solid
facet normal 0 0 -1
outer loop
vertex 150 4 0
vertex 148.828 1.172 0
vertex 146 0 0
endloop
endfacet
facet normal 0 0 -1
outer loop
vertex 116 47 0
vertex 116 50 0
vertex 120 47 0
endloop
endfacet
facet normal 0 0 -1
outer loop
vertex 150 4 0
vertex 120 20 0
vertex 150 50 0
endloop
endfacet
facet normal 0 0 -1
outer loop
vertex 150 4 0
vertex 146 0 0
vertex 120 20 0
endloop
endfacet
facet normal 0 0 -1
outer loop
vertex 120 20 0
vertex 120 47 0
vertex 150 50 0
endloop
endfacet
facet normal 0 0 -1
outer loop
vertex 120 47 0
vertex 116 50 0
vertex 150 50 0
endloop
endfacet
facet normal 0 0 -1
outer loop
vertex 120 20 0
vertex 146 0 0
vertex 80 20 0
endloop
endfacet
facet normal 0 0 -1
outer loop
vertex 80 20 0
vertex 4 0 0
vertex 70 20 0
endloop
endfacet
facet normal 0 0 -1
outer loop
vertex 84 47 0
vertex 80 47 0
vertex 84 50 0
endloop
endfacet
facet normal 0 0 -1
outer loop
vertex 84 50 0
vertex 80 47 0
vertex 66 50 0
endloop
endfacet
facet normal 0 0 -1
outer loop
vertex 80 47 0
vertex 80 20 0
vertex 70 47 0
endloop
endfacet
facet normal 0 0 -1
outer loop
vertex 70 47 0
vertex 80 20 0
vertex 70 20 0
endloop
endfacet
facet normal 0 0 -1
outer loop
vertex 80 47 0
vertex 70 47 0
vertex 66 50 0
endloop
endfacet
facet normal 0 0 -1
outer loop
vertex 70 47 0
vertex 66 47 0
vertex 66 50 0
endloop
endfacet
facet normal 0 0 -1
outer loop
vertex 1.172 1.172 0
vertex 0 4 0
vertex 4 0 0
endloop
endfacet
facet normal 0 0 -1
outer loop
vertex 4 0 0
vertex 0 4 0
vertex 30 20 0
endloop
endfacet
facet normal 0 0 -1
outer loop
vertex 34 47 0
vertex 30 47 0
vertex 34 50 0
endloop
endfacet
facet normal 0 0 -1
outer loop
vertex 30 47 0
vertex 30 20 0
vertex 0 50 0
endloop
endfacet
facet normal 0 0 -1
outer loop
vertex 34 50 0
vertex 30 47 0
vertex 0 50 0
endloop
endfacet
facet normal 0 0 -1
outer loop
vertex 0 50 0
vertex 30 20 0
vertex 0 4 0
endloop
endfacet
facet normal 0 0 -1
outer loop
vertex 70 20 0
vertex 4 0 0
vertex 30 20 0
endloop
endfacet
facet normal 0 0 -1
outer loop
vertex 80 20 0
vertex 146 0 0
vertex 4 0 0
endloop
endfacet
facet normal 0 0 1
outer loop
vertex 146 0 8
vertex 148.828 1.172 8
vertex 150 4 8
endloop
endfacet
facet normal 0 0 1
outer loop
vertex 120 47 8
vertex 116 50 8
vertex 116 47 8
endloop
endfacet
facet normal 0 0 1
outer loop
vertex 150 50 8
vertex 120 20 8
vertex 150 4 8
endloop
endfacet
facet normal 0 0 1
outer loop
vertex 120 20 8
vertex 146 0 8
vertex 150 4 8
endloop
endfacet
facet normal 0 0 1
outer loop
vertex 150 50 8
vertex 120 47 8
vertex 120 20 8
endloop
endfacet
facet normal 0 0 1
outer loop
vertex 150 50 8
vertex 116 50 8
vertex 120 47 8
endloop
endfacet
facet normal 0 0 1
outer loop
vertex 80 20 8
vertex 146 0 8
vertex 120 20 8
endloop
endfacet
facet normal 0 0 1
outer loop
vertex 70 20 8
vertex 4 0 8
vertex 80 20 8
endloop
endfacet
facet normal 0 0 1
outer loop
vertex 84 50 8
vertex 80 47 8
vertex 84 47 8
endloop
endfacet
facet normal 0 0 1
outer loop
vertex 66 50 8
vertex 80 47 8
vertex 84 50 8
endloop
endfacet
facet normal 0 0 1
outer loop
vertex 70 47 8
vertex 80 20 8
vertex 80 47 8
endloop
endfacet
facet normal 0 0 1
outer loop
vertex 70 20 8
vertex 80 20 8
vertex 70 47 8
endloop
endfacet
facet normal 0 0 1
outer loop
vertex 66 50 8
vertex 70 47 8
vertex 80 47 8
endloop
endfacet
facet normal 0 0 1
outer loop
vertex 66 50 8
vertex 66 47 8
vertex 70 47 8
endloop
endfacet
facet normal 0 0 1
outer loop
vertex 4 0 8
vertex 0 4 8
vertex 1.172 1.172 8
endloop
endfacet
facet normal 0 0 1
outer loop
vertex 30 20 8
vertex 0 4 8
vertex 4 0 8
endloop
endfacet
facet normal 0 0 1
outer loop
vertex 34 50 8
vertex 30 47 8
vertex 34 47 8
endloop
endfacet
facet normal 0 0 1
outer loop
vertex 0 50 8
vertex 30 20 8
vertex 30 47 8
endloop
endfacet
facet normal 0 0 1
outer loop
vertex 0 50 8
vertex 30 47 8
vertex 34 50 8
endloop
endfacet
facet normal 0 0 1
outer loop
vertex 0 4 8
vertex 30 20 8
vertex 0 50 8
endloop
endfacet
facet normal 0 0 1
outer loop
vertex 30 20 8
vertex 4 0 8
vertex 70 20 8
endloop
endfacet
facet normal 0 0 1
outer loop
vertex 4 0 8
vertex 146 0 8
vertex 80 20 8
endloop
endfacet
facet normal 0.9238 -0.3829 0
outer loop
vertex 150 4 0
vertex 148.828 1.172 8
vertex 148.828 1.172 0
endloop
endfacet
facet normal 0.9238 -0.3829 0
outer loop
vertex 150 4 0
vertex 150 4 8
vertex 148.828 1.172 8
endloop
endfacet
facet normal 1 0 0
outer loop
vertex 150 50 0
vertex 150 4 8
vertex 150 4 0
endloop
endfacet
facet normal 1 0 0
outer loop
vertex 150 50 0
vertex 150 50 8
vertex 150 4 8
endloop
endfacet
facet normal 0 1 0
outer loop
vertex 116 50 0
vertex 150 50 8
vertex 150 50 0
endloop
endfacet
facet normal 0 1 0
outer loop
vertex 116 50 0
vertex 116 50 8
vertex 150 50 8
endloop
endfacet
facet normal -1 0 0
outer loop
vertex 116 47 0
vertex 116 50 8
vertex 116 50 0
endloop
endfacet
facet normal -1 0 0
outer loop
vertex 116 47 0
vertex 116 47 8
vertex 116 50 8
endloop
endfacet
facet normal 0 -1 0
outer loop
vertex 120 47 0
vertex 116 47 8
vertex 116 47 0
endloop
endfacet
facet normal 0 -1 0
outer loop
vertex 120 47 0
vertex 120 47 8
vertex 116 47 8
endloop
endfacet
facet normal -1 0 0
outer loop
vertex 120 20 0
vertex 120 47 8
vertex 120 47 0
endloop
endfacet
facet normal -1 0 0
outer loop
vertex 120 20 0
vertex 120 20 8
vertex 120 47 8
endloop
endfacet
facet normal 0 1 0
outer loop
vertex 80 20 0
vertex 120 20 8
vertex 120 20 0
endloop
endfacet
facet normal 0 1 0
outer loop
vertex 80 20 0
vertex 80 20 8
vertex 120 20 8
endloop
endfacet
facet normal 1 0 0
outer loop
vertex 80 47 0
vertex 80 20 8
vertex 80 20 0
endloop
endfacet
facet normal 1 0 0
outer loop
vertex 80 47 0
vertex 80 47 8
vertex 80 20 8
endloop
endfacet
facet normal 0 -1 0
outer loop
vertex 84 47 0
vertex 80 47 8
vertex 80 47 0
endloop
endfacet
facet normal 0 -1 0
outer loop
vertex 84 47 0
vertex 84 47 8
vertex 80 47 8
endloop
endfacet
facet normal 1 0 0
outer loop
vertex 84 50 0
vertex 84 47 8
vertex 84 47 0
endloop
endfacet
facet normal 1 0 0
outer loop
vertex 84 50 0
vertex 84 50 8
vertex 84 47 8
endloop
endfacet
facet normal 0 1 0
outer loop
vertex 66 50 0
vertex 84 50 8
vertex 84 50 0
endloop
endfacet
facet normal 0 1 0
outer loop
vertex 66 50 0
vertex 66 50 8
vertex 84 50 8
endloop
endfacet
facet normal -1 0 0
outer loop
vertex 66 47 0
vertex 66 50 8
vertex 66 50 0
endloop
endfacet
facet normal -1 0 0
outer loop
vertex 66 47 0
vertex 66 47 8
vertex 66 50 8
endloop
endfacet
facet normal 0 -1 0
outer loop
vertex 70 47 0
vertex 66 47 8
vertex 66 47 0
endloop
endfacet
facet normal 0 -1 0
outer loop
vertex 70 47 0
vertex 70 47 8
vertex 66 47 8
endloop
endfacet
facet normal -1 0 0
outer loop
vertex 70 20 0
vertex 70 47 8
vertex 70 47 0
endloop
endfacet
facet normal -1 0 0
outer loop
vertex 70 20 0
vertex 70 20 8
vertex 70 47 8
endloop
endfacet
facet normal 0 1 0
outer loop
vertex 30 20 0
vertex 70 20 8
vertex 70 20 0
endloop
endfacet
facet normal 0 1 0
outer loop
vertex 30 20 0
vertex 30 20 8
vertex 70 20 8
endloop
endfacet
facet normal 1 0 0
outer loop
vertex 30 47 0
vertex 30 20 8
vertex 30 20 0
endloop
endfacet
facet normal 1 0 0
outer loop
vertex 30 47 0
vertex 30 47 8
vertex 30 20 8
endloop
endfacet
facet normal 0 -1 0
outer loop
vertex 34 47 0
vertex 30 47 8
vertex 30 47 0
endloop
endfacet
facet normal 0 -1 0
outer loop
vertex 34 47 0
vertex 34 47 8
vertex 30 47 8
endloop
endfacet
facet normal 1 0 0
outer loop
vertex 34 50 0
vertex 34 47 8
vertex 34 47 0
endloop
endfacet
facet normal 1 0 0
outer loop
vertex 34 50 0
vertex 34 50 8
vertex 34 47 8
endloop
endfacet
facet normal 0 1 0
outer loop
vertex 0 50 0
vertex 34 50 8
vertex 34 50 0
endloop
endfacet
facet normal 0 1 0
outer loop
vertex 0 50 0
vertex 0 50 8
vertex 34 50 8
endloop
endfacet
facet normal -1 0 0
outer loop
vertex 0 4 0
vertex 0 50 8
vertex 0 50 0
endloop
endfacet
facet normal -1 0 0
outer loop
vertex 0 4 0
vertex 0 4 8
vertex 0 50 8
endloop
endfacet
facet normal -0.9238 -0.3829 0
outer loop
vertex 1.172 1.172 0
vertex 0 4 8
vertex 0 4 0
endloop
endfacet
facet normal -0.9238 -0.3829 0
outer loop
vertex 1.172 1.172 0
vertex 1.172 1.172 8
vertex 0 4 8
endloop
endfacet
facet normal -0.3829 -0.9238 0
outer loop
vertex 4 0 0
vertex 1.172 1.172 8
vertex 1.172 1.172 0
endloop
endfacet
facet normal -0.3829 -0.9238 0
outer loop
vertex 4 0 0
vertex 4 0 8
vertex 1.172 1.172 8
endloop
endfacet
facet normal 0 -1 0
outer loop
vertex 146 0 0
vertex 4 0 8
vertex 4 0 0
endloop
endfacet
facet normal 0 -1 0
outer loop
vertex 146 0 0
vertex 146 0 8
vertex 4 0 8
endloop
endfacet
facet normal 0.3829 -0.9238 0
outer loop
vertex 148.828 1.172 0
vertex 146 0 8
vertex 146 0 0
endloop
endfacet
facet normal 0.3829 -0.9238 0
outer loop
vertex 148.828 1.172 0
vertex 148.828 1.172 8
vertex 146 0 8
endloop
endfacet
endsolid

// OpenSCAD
$fn = 32;

// ----------------------------------------------------------------------
// Oversize slot bar: 150 mm bar with 2 oversize windows
// ----------------------------------------------------------------------

// --- parameters (mm) ---
profile_height = 8;       // extrusion height
profile_points = 24;      // points of the closed outline

profile = [[0, 4], [1.172, 1.172], [4, 0], [146, 0], [148.828, 1.172], [150, 4], [150, 50], [116, 50], [116, 47], [120, 47], [120, 20], [80, 20], [80, 47], [84, 47], [84, 50], [66, 50], [66, 47], [70, 47], [70, 20], [30, 20], [30, 47], [34, 47], [34, 50], [0, 50]];  // single closed polygon, 24 points, counter clockwise

// --- the one profile operation ---
linear_extrude(height = profile_height) polygon(points = profile);
